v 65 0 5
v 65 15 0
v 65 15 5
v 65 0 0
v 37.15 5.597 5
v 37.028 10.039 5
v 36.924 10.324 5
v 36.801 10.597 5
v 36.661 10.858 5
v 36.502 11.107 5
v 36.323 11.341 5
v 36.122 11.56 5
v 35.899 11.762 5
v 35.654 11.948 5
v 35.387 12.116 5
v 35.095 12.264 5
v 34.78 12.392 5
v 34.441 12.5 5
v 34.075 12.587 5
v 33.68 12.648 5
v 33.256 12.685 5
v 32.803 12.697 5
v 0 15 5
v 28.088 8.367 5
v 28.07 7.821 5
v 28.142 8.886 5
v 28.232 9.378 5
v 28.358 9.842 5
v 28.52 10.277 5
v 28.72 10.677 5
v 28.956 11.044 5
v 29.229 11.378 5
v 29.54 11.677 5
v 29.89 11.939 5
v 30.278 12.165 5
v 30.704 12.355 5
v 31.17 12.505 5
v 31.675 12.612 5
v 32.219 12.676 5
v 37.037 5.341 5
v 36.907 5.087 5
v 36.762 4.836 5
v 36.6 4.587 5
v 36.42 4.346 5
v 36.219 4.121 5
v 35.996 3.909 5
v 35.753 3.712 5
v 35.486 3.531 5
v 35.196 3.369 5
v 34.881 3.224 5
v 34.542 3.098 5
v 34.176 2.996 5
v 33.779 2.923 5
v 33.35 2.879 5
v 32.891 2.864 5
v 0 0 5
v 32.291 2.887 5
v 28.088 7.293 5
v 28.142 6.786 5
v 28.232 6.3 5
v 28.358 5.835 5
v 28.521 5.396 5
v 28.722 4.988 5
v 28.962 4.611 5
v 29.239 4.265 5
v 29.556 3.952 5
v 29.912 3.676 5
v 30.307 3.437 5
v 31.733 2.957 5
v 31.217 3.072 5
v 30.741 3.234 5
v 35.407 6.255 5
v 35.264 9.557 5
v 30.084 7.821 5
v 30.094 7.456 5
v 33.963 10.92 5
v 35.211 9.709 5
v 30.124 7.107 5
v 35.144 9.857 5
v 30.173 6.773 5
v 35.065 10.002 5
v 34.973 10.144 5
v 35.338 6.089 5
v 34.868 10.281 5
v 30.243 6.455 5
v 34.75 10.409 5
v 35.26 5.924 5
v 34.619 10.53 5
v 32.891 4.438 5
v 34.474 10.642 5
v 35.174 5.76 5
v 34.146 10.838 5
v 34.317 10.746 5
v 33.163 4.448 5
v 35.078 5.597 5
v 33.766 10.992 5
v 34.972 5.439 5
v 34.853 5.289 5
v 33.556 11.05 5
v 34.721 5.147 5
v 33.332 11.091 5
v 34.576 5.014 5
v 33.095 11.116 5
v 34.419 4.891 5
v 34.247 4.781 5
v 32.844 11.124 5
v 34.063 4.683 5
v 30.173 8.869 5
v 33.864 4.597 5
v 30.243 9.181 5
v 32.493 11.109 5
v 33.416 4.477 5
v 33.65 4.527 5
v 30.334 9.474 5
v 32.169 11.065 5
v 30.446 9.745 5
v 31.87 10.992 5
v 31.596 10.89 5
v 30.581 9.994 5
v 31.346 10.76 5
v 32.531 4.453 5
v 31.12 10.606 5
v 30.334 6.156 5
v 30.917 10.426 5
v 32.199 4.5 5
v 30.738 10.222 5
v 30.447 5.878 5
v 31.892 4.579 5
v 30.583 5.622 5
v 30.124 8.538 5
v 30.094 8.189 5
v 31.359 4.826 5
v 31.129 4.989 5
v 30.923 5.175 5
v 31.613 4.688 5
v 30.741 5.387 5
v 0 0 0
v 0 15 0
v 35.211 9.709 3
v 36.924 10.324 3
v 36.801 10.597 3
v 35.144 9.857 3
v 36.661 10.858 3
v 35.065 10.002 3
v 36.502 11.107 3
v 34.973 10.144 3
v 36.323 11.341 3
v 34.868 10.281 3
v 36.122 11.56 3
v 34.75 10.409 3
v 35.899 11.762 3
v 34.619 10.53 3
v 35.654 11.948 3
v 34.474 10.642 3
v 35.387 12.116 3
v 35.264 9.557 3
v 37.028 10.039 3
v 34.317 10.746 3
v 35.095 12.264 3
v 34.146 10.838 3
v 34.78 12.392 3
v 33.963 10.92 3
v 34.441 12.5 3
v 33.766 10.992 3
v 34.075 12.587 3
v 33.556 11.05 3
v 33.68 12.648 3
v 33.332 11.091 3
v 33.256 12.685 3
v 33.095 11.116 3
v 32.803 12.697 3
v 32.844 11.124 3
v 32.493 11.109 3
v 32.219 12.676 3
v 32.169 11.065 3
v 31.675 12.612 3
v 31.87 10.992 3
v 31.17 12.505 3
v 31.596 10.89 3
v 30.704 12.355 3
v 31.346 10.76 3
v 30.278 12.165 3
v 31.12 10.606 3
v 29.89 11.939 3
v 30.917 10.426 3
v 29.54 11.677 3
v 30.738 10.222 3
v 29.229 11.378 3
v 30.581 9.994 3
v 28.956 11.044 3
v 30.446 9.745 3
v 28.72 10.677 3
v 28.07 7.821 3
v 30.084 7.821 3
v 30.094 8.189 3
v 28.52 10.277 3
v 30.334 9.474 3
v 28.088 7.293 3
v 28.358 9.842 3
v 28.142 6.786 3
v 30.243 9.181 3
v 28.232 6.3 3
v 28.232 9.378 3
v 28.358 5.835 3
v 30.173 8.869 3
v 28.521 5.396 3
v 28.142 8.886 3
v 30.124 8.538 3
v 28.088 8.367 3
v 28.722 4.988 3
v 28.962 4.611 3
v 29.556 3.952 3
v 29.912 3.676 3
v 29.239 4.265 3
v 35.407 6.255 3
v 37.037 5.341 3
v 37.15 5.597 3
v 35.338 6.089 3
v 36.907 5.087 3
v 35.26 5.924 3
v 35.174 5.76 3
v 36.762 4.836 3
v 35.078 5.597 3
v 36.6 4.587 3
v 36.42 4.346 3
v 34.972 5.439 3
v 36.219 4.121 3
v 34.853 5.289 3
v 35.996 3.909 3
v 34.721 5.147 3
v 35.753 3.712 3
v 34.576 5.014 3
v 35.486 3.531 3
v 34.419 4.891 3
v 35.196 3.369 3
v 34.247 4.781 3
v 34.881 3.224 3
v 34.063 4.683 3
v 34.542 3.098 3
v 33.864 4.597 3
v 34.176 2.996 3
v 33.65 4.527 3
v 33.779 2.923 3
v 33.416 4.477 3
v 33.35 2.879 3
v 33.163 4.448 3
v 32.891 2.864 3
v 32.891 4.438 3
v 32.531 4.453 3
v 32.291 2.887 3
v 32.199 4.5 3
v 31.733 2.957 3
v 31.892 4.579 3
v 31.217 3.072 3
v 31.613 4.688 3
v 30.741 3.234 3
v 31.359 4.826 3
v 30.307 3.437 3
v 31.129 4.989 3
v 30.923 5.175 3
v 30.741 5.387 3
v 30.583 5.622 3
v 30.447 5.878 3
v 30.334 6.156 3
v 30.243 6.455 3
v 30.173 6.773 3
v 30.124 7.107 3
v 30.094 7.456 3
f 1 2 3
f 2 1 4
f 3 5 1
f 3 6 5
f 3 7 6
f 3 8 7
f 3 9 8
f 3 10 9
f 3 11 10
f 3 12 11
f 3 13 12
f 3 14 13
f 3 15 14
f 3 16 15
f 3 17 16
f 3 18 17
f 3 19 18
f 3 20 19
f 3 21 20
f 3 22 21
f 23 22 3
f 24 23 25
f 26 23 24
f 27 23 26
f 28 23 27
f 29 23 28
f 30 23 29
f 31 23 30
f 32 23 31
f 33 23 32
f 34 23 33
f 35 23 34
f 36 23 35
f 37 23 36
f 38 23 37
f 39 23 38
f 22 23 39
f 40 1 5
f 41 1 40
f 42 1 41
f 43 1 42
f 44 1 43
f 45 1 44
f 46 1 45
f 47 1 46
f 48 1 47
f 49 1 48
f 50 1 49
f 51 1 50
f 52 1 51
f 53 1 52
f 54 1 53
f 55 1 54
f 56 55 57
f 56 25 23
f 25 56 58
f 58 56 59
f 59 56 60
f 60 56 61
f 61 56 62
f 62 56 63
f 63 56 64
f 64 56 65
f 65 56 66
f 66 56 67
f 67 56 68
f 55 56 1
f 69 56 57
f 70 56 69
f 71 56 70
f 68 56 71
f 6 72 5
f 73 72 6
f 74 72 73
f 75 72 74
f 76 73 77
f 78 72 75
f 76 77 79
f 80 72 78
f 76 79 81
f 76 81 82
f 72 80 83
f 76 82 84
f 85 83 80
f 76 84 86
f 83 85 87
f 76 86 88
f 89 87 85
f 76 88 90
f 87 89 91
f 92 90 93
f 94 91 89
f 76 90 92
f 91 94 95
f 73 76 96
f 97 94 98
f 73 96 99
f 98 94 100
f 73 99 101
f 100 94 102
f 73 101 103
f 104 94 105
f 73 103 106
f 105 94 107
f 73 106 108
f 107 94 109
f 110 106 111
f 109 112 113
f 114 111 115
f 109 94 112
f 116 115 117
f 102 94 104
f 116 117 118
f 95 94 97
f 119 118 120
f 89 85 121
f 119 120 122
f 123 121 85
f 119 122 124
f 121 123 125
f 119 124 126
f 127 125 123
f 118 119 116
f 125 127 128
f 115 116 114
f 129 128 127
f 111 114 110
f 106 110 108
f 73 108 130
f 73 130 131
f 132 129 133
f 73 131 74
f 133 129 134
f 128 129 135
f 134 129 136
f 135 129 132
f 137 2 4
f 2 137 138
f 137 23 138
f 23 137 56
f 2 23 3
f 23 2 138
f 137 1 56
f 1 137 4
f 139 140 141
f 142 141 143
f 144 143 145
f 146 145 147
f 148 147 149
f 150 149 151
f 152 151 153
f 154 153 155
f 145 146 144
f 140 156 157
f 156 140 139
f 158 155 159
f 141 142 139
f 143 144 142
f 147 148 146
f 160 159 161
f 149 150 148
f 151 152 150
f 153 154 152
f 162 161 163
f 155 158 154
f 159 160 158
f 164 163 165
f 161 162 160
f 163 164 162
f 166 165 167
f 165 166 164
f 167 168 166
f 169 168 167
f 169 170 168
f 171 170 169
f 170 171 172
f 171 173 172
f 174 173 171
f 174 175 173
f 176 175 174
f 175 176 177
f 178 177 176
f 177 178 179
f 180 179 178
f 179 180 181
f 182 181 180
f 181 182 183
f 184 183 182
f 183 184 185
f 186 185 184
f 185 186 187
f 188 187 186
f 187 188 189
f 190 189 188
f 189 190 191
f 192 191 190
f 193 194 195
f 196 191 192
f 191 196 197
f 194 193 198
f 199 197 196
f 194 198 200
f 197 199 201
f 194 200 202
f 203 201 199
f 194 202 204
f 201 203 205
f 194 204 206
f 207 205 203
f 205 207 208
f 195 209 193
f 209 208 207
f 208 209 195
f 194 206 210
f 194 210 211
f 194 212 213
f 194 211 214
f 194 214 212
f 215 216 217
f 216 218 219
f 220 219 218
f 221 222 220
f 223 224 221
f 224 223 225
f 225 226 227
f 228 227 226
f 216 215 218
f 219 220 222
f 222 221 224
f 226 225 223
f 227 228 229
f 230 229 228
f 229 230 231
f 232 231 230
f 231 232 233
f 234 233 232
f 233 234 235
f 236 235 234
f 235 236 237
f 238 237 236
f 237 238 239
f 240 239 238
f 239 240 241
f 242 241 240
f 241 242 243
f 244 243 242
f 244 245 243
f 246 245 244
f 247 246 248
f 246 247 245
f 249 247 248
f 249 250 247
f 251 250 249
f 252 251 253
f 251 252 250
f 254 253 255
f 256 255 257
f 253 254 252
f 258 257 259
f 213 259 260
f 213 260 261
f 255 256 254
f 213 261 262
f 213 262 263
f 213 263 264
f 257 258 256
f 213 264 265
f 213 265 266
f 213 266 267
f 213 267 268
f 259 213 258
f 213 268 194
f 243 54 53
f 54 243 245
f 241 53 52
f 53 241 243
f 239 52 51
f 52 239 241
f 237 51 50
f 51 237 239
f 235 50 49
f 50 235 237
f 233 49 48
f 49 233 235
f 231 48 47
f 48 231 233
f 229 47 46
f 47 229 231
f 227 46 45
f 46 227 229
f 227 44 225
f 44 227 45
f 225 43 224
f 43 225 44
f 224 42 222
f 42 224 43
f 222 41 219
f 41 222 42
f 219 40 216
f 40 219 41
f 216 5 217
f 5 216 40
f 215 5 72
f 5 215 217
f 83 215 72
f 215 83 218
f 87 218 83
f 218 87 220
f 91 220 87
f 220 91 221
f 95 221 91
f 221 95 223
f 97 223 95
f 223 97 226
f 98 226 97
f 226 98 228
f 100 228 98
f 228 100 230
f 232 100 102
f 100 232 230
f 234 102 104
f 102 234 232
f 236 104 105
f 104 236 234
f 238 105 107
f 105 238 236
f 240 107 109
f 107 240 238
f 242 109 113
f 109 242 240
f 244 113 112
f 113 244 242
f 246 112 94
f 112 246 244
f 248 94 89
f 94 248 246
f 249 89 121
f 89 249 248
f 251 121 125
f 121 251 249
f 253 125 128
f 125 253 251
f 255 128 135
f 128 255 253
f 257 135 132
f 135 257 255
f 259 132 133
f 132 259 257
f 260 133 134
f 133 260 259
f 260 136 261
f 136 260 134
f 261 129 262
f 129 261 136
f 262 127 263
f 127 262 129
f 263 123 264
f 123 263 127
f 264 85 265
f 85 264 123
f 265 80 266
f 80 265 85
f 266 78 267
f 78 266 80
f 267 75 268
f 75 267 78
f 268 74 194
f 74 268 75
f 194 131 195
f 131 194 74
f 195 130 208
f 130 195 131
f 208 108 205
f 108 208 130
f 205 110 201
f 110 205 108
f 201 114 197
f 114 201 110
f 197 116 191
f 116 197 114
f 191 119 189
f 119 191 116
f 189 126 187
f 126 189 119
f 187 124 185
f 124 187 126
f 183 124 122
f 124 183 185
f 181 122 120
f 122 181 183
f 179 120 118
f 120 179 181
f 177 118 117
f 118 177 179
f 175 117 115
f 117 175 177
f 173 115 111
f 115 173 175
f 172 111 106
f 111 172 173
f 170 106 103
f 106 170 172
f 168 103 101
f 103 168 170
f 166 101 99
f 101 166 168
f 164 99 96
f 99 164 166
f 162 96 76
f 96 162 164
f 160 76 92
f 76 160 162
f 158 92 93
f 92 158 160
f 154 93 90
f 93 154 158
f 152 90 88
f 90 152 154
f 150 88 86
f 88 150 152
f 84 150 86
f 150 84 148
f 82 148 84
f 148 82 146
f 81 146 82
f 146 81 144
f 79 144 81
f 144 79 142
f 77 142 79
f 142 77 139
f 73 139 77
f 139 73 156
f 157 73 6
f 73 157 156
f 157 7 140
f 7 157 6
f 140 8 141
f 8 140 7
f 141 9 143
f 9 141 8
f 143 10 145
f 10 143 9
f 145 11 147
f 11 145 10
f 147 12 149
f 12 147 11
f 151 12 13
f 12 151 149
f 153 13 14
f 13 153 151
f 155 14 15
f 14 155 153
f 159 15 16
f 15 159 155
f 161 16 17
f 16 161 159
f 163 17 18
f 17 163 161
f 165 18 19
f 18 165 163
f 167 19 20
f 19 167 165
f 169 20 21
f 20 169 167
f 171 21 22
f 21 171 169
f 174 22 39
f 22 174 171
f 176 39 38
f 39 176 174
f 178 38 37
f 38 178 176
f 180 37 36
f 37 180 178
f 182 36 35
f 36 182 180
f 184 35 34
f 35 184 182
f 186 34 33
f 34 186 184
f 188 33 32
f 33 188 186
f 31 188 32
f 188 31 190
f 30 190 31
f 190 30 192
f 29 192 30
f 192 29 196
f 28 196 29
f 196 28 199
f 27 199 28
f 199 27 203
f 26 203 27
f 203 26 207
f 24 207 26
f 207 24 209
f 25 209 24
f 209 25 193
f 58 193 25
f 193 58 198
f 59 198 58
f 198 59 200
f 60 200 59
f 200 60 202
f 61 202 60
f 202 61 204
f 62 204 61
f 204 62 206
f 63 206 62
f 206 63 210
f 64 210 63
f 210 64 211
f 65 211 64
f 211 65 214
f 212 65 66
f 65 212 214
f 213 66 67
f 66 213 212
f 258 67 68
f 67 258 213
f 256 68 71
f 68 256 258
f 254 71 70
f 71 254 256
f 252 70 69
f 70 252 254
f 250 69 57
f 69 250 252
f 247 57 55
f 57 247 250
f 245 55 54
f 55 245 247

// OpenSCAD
difference(){
	union(){ 
        translate([0,0,0]){
           cube([65,15,5], center=false);
        }                
	}
	union() {
        translate([60-65/2, 3,3]){
            linear_extrude(height = 10) {
                text("C", size = 10, font="Arial:style=Bold");
            }
        }                


	}
}
